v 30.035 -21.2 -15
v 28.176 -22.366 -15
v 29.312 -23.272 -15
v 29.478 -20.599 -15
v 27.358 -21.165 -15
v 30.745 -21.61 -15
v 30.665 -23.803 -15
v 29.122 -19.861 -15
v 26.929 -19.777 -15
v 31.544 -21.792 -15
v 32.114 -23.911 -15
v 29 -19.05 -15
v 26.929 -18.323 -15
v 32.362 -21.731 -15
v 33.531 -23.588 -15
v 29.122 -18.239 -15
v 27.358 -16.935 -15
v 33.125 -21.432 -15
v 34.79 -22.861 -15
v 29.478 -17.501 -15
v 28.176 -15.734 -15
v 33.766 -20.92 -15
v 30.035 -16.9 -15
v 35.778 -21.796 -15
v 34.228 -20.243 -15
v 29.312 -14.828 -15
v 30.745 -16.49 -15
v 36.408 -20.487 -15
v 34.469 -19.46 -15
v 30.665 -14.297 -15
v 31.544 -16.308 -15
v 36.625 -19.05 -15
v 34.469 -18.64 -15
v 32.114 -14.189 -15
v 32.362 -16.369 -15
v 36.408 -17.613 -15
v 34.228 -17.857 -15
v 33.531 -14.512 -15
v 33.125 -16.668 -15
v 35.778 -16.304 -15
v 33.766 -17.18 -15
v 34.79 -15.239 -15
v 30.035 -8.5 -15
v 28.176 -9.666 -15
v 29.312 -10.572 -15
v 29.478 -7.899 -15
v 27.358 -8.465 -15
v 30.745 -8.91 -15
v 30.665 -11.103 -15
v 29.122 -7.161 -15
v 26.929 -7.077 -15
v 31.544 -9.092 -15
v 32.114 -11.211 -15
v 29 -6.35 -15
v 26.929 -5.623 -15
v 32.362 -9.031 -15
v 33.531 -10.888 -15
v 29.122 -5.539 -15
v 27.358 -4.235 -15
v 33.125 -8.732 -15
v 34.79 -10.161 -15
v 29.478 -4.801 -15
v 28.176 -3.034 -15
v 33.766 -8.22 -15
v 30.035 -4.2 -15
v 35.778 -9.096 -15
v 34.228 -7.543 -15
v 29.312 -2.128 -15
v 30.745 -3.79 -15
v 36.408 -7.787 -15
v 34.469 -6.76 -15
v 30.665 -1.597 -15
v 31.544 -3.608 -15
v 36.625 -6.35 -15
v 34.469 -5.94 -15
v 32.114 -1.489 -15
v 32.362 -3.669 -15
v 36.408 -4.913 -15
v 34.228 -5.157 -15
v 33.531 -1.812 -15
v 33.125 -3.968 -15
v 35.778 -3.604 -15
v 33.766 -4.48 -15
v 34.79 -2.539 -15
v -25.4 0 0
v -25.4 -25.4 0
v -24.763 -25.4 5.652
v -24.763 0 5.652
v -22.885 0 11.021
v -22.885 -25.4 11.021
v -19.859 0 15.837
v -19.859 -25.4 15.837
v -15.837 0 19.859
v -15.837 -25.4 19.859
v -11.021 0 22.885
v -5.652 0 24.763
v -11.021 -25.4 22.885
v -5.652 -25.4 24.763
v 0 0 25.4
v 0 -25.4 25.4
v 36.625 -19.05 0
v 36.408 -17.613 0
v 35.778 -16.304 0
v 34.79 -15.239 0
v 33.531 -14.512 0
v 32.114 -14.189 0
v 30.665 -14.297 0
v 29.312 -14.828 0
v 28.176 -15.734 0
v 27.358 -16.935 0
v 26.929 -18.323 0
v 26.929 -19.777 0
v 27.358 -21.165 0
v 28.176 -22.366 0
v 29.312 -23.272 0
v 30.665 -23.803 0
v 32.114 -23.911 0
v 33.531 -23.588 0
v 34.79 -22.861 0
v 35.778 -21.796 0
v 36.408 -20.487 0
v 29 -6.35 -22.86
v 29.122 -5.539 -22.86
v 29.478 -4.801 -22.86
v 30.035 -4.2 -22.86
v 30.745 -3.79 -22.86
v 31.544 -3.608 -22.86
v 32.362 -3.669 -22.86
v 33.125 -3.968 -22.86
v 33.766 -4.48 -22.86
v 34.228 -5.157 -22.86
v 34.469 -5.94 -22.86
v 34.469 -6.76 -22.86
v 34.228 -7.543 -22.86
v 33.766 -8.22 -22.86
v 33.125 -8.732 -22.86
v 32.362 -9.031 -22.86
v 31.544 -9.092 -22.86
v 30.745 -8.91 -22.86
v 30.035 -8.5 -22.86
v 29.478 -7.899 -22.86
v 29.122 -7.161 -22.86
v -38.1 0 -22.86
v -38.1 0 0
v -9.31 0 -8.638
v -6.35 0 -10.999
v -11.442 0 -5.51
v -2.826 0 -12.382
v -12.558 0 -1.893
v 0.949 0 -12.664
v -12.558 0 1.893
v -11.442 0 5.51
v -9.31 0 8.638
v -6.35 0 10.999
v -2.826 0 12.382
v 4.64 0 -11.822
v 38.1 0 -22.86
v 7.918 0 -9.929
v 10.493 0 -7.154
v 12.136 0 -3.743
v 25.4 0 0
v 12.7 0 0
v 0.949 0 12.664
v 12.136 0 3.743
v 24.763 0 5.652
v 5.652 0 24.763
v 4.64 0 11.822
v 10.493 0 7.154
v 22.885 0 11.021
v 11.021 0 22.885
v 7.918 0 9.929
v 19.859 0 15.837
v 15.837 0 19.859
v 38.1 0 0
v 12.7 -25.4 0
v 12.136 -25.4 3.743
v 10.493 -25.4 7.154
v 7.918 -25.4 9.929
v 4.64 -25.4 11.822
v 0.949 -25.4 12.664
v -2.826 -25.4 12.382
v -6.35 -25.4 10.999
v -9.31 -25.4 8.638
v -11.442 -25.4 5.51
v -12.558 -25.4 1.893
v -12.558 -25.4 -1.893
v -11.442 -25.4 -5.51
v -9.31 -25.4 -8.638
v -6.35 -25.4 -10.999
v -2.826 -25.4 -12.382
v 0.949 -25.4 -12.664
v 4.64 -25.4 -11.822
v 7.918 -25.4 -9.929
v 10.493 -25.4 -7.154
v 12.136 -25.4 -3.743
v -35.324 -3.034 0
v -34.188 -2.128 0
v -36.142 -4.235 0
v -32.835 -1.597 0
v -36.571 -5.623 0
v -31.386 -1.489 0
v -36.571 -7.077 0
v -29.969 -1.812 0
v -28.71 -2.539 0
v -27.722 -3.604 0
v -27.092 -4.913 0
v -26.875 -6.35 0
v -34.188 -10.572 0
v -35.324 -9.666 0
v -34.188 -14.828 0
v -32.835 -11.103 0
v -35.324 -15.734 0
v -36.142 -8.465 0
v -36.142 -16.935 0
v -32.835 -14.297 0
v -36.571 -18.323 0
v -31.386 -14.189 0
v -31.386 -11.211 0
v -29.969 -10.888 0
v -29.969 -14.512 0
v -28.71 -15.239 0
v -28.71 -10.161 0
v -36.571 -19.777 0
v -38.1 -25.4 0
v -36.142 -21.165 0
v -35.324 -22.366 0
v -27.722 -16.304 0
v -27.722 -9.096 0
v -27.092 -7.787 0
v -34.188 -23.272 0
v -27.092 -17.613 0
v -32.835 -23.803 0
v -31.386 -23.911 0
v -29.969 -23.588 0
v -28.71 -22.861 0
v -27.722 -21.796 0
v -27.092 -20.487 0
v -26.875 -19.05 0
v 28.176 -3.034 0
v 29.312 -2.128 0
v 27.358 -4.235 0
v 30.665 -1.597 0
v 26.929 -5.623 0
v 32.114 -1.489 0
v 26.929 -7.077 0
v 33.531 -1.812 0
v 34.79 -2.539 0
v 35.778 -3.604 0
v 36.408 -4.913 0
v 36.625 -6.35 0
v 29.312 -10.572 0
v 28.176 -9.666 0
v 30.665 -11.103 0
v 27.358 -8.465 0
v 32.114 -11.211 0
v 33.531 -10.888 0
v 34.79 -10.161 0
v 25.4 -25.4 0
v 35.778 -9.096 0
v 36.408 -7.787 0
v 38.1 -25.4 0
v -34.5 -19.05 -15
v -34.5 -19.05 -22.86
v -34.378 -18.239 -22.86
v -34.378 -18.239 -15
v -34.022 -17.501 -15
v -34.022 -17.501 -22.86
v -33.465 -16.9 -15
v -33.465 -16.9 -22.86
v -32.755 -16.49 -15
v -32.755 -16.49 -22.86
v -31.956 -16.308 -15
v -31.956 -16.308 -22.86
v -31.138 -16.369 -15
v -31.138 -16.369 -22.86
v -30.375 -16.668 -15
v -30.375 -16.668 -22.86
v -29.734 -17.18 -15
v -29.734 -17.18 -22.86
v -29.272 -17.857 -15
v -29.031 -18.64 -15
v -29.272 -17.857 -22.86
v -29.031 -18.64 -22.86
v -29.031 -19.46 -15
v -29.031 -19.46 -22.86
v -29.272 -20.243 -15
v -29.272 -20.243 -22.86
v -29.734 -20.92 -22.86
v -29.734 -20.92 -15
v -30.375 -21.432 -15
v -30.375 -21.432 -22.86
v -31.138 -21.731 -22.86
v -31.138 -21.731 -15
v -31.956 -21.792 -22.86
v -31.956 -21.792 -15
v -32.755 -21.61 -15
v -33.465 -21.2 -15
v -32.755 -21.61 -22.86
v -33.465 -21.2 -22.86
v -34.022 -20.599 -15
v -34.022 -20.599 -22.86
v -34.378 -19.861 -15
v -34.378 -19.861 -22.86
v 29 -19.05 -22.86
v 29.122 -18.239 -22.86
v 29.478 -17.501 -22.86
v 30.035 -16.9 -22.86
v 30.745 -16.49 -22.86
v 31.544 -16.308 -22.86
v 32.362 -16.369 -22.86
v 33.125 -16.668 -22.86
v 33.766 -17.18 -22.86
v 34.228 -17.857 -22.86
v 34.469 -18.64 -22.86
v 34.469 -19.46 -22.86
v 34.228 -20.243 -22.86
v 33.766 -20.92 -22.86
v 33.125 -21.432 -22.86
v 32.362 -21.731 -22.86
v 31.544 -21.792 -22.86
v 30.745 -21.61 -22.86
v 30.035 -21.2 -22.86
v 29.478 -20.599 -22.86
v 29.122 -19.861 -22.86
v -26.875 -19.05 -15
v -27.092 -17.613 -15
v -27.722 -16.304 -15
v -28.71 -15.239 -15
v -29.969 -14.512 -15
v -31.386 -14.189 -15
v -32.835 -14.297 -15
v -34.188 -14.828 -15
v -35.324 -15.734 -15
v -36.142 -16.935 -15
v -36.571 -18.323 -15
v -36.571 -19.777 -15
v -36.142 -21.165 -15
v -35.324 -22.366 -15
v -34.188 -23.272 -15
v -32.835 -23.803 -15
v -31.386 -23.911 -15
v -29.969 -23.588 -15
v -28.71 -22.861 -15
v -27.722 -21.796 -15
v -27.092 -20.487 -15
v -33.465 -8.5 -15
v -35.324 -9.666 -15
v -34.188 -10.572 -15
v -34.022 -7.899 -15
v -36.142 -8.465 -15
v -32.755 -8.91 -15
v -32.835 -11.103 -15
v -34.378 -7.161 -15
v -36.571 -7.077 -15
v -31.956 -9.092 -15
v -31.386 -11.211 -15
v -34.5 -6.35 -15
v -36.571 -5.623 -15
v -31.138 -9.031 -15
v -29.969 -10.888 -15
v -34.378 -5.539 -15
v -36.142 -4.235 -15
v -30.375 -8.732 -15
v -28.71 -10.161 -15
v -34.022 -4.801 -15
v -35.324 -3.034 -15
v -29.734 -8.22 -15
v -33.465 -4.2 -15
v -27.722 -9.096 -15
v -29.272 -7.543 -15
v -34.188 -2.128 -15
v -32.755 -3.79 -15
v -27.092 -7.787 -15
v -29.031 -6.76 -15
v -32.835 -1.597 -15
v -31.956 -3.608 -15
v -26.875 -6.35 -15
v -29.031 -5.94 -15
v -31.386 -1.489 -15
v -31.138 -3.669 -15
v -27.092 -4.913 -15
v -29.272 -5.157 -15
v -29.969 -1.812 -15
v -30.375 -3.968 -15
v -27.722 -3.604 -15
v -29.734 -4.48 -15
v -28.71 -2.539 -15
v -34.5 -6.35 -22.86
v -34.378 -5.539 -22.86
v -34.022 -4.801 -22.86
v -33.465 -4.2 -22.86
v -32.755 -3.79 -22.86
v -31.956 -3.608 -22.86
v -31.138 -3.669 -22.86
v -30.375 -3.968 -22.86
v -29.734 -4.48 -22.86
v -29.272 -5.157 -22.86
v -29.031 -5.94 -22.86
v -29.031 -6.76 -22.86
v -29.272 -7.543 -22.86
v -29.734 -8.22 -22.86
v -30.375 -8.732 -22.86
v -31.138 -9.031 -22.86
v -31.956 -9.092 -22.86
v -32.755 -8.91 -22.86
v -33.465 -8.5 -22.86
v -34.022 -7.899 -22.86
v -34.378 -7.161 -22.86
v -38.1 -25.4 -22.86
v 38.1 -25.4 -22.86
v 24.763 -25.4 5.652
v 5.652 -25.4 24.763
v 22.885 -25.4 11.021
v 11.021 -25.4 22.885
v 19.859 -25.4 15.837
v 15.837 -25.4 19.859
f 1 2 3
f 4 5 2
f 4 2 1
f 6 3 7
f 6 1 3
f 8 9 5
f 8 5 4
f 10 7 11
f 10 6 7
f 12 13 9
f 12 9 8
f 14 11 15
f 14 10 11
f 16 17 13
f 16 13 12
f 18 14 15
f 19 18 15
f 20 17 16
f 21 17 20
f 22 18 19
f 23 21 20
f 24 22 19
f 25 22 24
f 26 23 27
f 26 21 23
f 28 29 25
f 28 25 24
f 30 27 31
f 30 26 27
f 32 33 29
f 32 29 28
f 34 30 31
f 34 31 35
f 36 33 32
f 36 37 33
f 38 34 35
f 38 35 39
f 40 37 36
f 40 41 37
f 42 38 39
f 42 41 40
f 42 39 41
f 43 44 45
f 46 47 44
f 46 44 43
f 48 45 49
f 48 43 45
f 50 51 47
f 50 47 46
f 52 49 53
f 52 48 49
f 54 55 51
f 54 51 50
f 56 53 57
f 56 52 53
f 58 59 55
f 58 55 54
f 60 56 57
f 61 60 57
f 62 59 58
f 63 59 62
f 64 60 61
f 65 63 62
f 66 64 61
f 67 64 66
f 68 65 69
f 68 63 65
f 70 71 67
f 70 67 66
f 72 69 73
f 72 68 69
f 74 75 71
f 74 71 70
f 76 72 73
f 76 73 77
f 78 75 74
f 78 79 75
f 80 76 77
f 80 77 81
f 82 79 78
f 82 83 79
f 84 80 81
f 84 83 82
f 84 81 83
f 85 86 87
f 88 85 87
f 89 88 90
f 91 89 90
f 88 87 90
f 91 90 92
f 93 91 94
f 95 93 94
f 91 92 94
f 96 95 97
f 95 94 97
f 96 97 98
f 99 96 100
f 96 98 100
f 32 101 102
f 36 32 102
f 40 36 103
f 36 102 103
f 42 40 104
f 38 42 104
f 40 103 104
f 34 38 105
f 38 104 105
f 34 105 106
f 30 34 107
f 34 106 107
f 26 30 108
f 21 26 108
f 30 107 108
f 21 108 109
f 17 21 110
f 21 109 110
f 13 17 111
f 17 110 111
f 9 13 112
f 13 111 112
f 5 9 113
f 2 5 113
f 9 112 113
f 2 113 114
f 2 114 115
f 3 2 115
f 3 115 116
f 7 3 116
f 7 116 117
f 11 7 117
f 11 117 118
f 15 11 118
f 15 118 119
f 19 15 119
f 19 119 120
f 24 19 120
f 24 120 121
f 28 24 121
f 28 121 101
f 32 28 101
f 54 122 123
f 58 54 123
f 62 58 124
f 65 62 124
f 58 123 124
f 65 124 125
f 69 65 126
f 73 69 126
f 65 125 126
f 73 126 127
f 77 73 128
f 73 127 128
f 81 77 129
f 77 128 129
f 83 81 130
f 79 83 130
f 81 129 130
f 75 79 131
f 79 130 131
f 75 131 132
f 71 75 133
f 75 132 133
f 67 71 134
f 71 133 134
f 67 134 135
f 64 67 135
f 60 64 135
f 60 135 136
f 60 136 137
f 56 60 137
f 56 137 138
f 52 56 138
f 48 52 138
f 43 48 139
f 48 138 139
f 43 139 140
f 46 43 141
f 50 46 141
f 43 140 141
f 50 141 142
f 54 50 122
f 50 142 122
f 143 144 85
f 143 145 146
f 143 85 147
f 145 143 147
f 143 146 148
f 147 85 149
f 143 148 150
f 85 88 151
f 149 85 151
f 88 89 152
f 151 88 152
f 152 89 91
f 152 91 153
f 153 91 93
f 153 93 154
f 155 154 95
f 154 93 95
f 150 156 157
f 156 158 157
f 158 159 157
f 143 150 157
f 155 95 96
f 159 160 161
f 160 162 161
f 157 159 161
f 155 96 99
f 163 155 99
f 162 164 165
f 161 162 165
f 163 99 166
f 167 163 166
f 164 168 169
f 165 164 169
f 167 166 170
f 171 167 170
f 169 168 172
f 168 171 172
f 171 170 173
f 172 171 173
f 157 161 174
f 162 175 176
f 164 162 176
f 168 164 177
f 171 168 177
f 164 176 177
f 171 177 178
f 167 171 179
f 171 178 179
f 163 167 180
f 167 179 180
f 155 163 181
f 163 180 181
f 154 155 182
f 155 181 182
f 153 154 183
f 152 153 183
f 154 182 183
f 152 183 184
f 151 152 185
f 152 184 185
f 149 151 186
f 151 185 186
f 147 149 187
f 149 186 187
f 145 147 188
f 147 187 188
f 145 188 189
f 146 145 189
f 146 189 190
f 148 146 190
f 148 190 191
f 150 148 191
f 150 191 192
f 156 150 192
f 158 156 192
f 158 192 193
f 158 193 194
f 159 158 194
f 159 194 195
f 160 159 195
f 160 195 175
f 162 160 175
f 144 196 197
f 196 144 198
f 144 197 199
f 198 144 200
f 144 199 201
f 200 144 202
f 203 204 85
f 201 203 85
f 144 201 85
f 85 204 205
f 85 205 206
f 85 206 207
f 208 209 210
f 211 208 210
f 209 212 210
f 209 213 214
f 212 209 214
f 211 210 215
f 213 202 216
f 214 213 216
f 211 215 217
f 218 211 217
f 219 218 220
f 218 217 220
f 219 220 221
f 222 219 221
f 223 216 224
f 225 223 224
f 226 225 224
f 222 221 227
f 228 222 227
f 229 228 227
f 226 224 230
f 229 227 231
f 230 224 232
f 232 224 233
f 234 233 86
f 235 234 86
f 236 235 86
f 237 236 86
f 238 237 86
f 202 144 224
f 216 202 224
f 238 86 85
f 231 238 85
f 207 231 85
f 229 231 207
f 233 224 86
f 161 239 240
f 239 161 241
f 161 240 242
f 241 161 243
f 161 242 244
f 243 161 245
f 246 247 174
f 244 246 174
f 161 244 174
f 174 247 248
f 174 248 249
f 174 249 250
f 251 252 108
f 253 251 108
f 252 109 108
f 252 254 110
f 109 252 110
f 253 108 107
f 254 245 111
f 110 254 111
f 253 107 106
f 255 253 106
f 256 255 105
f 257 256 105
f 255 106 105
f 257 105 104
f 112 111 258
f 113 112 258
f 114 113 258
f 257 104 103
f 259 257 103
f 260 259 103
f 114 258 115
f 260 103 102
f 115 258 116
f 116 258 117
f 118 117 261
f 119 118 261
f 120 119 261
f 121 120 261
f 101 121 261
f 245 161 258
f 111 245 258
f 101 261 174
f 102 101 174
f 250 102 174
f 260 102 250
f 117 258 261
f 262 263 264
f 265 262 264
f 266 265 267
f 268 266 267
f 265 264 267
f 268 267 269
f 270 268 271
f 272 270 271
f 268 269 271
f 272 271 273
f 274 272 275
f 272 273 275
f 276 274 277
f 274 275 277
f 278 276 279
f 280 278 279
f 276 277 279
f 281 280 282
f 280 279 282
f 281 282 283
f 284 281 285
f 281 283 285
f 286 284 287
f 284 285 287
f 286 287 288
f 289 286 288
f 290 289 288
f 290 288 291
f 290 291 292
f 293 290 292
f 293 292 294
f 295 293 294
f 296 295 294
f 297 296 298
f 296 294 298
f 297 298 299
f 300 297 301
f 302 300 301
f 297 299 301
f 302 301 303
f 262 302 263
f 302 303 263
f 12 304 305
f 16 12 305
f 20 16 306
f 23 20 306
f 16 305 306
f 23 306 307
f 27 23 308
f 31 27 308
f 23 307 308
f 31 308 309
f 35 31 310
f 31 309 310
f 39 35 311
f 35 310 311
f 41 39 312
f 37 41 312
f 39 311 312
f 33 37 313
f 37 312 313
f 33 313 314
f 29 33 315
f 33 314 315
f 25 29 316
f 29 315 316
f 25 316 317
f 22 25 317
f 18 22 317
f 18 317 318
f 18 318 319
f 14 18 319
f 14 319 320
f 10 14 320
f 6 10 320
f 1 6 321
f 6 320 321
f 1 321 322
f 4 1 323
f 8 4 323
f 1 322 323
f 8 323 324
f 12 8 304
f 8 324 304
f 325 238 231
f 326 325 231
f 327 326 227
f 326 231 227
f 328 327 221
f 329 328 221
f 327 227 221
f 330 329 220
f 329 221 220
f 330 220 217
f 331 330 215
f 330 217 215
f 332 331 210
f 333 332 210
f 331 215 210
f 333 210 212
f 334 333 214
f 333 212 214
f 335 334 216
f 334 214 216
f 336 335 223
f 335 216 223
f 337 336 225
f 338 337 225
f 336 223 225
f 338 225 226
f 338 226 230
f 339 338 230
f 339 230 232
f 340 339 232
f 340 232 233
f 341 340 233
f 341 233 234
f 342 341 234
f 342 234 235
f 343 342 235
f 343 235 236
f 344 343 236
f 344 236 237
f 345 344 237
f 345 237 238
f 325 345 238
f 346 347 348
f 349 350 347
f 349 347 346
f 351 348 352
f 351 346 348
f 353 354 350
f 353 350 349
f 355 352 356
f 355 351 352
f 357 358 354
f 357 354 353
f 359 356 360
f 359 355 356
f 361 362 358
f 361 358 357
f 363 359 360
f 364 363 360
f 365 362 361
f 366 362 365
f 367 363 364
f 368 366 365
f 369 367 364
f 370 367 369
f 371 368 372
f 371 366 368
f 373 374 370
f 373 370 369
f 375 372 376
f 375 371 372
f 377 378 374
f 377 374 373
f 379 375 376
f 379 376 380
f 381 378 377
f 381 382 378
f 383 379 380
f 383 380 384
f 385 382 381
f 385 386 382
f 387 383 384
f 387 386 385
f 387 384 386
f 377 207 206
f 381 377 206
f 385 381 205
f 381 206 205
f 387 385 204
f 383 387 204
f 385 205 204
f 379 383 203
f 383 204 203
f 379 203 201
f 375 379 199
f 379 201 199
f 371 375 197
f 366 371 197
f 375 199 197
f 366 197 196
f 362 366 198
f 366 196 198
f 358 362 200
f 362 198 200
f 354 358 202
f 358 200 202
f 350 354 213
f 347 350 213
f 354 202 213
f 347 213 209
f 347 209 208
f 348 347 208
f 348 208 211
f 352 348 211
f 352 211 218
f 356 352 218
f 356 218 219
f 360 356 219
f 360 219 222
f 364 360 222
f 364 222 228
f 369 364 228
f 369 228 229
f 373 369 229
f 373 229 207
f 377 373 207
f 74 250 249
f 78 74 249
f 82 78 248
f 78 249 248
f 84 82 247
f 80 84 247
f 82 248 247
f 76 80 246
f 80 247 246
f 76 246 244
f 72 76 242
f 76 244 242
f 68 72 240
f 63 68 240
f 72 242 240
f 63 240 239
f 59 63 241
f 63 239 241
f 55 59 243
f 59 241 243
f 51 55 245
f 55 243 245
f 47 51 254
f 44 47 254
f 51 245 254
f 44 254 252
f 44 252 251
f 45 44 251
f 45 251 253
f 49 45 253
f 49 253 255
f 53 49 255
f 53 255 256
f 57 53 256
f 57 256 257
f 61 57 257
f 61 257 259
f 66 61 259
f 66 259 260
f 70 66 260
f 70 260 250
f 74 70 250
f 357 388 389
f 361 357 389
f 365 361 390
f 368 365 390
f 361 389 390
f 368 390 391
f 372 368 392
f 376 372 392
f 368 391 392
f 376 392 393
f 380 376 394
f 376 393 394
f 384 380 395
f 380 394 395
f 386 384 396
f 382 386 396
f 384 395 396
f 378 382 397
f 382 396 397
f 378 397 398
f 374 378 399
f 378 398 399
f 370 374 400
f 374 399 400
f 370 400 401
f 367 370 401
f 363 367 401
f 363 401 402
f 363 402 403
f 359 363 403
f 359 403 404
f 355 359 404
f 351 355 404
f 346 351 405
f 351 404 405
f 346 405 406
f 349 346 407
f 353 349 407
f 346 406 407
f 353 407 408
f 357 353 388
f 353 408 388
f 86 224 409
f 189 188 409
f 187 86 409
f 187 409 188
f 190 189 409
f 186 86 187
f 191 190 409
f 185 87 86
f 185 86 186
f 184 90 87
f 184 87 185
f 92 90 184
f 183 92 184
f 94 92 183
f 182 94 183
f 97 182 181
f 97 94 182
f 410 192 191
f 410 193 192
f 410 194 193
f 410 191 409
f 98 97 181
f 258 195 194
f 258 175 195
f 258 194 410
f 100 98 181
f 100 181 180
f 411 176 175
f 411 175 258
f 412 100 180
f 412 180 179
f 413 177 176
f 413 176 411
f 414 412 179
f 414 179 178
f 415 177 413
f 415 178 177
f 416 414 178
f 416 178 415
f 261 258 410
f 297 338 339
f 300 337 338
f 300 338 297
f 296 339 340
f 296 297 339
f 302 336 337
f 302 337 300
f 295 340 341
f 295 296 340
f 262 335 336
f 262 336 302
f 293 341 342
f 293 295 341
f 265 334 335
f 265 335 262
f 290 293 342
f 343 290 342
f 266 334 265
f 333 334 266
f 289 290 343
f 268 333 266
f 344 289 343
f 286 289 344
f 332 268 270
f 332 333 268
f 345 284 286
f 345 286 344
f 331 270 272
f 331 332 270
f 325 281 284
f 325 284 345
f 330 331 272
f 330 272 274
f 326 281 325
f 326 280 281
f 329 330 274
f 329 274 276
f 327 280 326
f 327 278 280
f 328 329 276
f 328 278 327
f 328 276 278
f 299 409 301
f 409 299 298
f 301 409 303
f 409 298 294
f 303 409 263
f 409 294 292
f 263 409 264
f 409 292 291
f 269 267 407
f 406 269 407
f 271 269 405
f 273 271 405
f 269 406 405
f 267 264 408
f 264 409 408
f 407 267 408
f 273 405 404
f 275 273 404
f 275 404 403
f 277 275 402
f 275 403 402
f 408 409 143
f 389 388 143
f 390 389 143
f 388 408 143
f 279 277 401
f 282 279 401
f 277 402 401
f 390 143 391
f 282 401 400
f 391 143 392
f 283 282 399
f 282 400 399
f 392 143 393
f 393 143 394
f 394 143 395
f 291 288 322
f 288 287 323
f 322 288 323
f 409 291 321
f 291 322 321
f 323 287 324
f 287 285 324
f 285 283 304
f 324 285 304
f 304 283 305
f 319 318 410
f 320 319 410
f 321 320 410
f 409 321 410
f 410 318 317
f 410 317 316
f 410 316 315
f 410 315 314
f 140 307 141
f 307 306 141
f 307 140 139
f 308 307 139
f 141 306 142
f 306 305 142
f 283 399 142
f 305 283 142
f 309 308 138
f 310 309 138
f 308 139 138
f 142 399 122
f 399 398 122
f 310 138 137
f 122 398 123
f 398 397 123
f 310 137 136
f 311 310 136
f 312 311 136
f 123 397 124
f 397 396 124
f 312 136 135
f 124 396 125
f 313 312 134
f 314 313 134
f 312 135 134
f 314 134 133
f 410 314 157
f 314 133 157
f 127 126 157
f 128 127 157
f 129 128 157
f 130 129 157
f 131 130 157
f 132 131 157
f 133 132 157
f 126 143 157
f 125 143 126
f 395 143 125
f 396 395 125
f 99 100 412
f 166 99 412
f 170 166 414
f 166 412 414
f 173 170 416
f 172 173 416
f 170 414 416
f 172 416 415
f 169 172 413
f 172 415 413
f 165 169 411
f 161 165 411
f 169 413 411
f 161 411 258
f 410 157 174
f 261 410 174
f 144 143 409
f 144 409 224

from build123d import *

# Parameters (mm, degrees)
F0_W           = 76.2
F0_H           = 50.8
F1_DEPTH       = 25.4
F2_R           = 12.7
F3_DEPTH       = 32.766
F5_DEPTH       = 25.4
F7_D           = 5.5
F7_DEPTH       = 254
F7_CBORE_D     = 9.75
F7_CBORE_DEPTH = 15
F7_TIP         = 1.6523667023
F8_DEPTH       = 2.54


with BuildPart() as f1:
    # F0 (on Front) → F1 (new body)
    with BuildSketch(Plane.XZ):
        Rectangle(F0_W, F0_H)
    extrude(amount=F1_DEPTH)

    # F2 (on face) → F3 (cut)
    with BuildSketch(Plane.XZ.offset(25.4)):
        Circle(F2_R)
    extrude(amount=-F3_DEPTH, mode=Mode.SUBTRACT)

    # F4 (on face) → F5 (cut)
    with BuildSketch(Plane.XZ.offset(25.4)):
        with BuildLine():
            ThreePointArc((1.5e-09, 25.4), (17.9605122427, 17.9605122416), (25.4, 0))
            Line((25.4, 0), (38.1, 0))
            Line((38.1, 0), (38.1, 25.4))
            Line((38.1, 25.4), (1.5e-09, 25.4))
        make_face()
        with BuildLine():
            ThreePointArc((-25.4, 0), (-17.9605122416, 17.9605122427), (1.5e-09, 25.4))
            Line((1.5e-09, 25.4), (-38.1, 25.4))
            Line((-38.1, 25.4), (-38.1, 0))
            Line((-38.1, 0), (-25.4, 0))
        make_face()
    extrude(amount=-F5_DEPTH, mode=Mode.SUBTRACT)

    # F7
    with Locations(Plane.XY):
        with Locations((-31.75, -6.35), (-31.75, -19.05), (31.75, -6.35), (31.75, -19.05)):
            CounterBoreHole(F7_D / 2, F7_CBORE_D / 2, F7_CBORE_DEPTH, depth=F7_DEPTH)
            with Locations((0, 0, -(F7_DEPTH + F7_TIP / 2))):  # 118° drill point
                Cone(0, F7_D / 2, F7_TIP, mode=Mode.SUBTRACT)

    # F8 (cut): a face of the model
    f8_faces = [f1.faces().sort_by_distance(p)[0] for p in [
        (0, -12.7, -25.4),
    ]]
    extrude(f8_faces, amount=-F8_DEPTH, mode=Mode.SUBTRACT)


solid = f1.part
